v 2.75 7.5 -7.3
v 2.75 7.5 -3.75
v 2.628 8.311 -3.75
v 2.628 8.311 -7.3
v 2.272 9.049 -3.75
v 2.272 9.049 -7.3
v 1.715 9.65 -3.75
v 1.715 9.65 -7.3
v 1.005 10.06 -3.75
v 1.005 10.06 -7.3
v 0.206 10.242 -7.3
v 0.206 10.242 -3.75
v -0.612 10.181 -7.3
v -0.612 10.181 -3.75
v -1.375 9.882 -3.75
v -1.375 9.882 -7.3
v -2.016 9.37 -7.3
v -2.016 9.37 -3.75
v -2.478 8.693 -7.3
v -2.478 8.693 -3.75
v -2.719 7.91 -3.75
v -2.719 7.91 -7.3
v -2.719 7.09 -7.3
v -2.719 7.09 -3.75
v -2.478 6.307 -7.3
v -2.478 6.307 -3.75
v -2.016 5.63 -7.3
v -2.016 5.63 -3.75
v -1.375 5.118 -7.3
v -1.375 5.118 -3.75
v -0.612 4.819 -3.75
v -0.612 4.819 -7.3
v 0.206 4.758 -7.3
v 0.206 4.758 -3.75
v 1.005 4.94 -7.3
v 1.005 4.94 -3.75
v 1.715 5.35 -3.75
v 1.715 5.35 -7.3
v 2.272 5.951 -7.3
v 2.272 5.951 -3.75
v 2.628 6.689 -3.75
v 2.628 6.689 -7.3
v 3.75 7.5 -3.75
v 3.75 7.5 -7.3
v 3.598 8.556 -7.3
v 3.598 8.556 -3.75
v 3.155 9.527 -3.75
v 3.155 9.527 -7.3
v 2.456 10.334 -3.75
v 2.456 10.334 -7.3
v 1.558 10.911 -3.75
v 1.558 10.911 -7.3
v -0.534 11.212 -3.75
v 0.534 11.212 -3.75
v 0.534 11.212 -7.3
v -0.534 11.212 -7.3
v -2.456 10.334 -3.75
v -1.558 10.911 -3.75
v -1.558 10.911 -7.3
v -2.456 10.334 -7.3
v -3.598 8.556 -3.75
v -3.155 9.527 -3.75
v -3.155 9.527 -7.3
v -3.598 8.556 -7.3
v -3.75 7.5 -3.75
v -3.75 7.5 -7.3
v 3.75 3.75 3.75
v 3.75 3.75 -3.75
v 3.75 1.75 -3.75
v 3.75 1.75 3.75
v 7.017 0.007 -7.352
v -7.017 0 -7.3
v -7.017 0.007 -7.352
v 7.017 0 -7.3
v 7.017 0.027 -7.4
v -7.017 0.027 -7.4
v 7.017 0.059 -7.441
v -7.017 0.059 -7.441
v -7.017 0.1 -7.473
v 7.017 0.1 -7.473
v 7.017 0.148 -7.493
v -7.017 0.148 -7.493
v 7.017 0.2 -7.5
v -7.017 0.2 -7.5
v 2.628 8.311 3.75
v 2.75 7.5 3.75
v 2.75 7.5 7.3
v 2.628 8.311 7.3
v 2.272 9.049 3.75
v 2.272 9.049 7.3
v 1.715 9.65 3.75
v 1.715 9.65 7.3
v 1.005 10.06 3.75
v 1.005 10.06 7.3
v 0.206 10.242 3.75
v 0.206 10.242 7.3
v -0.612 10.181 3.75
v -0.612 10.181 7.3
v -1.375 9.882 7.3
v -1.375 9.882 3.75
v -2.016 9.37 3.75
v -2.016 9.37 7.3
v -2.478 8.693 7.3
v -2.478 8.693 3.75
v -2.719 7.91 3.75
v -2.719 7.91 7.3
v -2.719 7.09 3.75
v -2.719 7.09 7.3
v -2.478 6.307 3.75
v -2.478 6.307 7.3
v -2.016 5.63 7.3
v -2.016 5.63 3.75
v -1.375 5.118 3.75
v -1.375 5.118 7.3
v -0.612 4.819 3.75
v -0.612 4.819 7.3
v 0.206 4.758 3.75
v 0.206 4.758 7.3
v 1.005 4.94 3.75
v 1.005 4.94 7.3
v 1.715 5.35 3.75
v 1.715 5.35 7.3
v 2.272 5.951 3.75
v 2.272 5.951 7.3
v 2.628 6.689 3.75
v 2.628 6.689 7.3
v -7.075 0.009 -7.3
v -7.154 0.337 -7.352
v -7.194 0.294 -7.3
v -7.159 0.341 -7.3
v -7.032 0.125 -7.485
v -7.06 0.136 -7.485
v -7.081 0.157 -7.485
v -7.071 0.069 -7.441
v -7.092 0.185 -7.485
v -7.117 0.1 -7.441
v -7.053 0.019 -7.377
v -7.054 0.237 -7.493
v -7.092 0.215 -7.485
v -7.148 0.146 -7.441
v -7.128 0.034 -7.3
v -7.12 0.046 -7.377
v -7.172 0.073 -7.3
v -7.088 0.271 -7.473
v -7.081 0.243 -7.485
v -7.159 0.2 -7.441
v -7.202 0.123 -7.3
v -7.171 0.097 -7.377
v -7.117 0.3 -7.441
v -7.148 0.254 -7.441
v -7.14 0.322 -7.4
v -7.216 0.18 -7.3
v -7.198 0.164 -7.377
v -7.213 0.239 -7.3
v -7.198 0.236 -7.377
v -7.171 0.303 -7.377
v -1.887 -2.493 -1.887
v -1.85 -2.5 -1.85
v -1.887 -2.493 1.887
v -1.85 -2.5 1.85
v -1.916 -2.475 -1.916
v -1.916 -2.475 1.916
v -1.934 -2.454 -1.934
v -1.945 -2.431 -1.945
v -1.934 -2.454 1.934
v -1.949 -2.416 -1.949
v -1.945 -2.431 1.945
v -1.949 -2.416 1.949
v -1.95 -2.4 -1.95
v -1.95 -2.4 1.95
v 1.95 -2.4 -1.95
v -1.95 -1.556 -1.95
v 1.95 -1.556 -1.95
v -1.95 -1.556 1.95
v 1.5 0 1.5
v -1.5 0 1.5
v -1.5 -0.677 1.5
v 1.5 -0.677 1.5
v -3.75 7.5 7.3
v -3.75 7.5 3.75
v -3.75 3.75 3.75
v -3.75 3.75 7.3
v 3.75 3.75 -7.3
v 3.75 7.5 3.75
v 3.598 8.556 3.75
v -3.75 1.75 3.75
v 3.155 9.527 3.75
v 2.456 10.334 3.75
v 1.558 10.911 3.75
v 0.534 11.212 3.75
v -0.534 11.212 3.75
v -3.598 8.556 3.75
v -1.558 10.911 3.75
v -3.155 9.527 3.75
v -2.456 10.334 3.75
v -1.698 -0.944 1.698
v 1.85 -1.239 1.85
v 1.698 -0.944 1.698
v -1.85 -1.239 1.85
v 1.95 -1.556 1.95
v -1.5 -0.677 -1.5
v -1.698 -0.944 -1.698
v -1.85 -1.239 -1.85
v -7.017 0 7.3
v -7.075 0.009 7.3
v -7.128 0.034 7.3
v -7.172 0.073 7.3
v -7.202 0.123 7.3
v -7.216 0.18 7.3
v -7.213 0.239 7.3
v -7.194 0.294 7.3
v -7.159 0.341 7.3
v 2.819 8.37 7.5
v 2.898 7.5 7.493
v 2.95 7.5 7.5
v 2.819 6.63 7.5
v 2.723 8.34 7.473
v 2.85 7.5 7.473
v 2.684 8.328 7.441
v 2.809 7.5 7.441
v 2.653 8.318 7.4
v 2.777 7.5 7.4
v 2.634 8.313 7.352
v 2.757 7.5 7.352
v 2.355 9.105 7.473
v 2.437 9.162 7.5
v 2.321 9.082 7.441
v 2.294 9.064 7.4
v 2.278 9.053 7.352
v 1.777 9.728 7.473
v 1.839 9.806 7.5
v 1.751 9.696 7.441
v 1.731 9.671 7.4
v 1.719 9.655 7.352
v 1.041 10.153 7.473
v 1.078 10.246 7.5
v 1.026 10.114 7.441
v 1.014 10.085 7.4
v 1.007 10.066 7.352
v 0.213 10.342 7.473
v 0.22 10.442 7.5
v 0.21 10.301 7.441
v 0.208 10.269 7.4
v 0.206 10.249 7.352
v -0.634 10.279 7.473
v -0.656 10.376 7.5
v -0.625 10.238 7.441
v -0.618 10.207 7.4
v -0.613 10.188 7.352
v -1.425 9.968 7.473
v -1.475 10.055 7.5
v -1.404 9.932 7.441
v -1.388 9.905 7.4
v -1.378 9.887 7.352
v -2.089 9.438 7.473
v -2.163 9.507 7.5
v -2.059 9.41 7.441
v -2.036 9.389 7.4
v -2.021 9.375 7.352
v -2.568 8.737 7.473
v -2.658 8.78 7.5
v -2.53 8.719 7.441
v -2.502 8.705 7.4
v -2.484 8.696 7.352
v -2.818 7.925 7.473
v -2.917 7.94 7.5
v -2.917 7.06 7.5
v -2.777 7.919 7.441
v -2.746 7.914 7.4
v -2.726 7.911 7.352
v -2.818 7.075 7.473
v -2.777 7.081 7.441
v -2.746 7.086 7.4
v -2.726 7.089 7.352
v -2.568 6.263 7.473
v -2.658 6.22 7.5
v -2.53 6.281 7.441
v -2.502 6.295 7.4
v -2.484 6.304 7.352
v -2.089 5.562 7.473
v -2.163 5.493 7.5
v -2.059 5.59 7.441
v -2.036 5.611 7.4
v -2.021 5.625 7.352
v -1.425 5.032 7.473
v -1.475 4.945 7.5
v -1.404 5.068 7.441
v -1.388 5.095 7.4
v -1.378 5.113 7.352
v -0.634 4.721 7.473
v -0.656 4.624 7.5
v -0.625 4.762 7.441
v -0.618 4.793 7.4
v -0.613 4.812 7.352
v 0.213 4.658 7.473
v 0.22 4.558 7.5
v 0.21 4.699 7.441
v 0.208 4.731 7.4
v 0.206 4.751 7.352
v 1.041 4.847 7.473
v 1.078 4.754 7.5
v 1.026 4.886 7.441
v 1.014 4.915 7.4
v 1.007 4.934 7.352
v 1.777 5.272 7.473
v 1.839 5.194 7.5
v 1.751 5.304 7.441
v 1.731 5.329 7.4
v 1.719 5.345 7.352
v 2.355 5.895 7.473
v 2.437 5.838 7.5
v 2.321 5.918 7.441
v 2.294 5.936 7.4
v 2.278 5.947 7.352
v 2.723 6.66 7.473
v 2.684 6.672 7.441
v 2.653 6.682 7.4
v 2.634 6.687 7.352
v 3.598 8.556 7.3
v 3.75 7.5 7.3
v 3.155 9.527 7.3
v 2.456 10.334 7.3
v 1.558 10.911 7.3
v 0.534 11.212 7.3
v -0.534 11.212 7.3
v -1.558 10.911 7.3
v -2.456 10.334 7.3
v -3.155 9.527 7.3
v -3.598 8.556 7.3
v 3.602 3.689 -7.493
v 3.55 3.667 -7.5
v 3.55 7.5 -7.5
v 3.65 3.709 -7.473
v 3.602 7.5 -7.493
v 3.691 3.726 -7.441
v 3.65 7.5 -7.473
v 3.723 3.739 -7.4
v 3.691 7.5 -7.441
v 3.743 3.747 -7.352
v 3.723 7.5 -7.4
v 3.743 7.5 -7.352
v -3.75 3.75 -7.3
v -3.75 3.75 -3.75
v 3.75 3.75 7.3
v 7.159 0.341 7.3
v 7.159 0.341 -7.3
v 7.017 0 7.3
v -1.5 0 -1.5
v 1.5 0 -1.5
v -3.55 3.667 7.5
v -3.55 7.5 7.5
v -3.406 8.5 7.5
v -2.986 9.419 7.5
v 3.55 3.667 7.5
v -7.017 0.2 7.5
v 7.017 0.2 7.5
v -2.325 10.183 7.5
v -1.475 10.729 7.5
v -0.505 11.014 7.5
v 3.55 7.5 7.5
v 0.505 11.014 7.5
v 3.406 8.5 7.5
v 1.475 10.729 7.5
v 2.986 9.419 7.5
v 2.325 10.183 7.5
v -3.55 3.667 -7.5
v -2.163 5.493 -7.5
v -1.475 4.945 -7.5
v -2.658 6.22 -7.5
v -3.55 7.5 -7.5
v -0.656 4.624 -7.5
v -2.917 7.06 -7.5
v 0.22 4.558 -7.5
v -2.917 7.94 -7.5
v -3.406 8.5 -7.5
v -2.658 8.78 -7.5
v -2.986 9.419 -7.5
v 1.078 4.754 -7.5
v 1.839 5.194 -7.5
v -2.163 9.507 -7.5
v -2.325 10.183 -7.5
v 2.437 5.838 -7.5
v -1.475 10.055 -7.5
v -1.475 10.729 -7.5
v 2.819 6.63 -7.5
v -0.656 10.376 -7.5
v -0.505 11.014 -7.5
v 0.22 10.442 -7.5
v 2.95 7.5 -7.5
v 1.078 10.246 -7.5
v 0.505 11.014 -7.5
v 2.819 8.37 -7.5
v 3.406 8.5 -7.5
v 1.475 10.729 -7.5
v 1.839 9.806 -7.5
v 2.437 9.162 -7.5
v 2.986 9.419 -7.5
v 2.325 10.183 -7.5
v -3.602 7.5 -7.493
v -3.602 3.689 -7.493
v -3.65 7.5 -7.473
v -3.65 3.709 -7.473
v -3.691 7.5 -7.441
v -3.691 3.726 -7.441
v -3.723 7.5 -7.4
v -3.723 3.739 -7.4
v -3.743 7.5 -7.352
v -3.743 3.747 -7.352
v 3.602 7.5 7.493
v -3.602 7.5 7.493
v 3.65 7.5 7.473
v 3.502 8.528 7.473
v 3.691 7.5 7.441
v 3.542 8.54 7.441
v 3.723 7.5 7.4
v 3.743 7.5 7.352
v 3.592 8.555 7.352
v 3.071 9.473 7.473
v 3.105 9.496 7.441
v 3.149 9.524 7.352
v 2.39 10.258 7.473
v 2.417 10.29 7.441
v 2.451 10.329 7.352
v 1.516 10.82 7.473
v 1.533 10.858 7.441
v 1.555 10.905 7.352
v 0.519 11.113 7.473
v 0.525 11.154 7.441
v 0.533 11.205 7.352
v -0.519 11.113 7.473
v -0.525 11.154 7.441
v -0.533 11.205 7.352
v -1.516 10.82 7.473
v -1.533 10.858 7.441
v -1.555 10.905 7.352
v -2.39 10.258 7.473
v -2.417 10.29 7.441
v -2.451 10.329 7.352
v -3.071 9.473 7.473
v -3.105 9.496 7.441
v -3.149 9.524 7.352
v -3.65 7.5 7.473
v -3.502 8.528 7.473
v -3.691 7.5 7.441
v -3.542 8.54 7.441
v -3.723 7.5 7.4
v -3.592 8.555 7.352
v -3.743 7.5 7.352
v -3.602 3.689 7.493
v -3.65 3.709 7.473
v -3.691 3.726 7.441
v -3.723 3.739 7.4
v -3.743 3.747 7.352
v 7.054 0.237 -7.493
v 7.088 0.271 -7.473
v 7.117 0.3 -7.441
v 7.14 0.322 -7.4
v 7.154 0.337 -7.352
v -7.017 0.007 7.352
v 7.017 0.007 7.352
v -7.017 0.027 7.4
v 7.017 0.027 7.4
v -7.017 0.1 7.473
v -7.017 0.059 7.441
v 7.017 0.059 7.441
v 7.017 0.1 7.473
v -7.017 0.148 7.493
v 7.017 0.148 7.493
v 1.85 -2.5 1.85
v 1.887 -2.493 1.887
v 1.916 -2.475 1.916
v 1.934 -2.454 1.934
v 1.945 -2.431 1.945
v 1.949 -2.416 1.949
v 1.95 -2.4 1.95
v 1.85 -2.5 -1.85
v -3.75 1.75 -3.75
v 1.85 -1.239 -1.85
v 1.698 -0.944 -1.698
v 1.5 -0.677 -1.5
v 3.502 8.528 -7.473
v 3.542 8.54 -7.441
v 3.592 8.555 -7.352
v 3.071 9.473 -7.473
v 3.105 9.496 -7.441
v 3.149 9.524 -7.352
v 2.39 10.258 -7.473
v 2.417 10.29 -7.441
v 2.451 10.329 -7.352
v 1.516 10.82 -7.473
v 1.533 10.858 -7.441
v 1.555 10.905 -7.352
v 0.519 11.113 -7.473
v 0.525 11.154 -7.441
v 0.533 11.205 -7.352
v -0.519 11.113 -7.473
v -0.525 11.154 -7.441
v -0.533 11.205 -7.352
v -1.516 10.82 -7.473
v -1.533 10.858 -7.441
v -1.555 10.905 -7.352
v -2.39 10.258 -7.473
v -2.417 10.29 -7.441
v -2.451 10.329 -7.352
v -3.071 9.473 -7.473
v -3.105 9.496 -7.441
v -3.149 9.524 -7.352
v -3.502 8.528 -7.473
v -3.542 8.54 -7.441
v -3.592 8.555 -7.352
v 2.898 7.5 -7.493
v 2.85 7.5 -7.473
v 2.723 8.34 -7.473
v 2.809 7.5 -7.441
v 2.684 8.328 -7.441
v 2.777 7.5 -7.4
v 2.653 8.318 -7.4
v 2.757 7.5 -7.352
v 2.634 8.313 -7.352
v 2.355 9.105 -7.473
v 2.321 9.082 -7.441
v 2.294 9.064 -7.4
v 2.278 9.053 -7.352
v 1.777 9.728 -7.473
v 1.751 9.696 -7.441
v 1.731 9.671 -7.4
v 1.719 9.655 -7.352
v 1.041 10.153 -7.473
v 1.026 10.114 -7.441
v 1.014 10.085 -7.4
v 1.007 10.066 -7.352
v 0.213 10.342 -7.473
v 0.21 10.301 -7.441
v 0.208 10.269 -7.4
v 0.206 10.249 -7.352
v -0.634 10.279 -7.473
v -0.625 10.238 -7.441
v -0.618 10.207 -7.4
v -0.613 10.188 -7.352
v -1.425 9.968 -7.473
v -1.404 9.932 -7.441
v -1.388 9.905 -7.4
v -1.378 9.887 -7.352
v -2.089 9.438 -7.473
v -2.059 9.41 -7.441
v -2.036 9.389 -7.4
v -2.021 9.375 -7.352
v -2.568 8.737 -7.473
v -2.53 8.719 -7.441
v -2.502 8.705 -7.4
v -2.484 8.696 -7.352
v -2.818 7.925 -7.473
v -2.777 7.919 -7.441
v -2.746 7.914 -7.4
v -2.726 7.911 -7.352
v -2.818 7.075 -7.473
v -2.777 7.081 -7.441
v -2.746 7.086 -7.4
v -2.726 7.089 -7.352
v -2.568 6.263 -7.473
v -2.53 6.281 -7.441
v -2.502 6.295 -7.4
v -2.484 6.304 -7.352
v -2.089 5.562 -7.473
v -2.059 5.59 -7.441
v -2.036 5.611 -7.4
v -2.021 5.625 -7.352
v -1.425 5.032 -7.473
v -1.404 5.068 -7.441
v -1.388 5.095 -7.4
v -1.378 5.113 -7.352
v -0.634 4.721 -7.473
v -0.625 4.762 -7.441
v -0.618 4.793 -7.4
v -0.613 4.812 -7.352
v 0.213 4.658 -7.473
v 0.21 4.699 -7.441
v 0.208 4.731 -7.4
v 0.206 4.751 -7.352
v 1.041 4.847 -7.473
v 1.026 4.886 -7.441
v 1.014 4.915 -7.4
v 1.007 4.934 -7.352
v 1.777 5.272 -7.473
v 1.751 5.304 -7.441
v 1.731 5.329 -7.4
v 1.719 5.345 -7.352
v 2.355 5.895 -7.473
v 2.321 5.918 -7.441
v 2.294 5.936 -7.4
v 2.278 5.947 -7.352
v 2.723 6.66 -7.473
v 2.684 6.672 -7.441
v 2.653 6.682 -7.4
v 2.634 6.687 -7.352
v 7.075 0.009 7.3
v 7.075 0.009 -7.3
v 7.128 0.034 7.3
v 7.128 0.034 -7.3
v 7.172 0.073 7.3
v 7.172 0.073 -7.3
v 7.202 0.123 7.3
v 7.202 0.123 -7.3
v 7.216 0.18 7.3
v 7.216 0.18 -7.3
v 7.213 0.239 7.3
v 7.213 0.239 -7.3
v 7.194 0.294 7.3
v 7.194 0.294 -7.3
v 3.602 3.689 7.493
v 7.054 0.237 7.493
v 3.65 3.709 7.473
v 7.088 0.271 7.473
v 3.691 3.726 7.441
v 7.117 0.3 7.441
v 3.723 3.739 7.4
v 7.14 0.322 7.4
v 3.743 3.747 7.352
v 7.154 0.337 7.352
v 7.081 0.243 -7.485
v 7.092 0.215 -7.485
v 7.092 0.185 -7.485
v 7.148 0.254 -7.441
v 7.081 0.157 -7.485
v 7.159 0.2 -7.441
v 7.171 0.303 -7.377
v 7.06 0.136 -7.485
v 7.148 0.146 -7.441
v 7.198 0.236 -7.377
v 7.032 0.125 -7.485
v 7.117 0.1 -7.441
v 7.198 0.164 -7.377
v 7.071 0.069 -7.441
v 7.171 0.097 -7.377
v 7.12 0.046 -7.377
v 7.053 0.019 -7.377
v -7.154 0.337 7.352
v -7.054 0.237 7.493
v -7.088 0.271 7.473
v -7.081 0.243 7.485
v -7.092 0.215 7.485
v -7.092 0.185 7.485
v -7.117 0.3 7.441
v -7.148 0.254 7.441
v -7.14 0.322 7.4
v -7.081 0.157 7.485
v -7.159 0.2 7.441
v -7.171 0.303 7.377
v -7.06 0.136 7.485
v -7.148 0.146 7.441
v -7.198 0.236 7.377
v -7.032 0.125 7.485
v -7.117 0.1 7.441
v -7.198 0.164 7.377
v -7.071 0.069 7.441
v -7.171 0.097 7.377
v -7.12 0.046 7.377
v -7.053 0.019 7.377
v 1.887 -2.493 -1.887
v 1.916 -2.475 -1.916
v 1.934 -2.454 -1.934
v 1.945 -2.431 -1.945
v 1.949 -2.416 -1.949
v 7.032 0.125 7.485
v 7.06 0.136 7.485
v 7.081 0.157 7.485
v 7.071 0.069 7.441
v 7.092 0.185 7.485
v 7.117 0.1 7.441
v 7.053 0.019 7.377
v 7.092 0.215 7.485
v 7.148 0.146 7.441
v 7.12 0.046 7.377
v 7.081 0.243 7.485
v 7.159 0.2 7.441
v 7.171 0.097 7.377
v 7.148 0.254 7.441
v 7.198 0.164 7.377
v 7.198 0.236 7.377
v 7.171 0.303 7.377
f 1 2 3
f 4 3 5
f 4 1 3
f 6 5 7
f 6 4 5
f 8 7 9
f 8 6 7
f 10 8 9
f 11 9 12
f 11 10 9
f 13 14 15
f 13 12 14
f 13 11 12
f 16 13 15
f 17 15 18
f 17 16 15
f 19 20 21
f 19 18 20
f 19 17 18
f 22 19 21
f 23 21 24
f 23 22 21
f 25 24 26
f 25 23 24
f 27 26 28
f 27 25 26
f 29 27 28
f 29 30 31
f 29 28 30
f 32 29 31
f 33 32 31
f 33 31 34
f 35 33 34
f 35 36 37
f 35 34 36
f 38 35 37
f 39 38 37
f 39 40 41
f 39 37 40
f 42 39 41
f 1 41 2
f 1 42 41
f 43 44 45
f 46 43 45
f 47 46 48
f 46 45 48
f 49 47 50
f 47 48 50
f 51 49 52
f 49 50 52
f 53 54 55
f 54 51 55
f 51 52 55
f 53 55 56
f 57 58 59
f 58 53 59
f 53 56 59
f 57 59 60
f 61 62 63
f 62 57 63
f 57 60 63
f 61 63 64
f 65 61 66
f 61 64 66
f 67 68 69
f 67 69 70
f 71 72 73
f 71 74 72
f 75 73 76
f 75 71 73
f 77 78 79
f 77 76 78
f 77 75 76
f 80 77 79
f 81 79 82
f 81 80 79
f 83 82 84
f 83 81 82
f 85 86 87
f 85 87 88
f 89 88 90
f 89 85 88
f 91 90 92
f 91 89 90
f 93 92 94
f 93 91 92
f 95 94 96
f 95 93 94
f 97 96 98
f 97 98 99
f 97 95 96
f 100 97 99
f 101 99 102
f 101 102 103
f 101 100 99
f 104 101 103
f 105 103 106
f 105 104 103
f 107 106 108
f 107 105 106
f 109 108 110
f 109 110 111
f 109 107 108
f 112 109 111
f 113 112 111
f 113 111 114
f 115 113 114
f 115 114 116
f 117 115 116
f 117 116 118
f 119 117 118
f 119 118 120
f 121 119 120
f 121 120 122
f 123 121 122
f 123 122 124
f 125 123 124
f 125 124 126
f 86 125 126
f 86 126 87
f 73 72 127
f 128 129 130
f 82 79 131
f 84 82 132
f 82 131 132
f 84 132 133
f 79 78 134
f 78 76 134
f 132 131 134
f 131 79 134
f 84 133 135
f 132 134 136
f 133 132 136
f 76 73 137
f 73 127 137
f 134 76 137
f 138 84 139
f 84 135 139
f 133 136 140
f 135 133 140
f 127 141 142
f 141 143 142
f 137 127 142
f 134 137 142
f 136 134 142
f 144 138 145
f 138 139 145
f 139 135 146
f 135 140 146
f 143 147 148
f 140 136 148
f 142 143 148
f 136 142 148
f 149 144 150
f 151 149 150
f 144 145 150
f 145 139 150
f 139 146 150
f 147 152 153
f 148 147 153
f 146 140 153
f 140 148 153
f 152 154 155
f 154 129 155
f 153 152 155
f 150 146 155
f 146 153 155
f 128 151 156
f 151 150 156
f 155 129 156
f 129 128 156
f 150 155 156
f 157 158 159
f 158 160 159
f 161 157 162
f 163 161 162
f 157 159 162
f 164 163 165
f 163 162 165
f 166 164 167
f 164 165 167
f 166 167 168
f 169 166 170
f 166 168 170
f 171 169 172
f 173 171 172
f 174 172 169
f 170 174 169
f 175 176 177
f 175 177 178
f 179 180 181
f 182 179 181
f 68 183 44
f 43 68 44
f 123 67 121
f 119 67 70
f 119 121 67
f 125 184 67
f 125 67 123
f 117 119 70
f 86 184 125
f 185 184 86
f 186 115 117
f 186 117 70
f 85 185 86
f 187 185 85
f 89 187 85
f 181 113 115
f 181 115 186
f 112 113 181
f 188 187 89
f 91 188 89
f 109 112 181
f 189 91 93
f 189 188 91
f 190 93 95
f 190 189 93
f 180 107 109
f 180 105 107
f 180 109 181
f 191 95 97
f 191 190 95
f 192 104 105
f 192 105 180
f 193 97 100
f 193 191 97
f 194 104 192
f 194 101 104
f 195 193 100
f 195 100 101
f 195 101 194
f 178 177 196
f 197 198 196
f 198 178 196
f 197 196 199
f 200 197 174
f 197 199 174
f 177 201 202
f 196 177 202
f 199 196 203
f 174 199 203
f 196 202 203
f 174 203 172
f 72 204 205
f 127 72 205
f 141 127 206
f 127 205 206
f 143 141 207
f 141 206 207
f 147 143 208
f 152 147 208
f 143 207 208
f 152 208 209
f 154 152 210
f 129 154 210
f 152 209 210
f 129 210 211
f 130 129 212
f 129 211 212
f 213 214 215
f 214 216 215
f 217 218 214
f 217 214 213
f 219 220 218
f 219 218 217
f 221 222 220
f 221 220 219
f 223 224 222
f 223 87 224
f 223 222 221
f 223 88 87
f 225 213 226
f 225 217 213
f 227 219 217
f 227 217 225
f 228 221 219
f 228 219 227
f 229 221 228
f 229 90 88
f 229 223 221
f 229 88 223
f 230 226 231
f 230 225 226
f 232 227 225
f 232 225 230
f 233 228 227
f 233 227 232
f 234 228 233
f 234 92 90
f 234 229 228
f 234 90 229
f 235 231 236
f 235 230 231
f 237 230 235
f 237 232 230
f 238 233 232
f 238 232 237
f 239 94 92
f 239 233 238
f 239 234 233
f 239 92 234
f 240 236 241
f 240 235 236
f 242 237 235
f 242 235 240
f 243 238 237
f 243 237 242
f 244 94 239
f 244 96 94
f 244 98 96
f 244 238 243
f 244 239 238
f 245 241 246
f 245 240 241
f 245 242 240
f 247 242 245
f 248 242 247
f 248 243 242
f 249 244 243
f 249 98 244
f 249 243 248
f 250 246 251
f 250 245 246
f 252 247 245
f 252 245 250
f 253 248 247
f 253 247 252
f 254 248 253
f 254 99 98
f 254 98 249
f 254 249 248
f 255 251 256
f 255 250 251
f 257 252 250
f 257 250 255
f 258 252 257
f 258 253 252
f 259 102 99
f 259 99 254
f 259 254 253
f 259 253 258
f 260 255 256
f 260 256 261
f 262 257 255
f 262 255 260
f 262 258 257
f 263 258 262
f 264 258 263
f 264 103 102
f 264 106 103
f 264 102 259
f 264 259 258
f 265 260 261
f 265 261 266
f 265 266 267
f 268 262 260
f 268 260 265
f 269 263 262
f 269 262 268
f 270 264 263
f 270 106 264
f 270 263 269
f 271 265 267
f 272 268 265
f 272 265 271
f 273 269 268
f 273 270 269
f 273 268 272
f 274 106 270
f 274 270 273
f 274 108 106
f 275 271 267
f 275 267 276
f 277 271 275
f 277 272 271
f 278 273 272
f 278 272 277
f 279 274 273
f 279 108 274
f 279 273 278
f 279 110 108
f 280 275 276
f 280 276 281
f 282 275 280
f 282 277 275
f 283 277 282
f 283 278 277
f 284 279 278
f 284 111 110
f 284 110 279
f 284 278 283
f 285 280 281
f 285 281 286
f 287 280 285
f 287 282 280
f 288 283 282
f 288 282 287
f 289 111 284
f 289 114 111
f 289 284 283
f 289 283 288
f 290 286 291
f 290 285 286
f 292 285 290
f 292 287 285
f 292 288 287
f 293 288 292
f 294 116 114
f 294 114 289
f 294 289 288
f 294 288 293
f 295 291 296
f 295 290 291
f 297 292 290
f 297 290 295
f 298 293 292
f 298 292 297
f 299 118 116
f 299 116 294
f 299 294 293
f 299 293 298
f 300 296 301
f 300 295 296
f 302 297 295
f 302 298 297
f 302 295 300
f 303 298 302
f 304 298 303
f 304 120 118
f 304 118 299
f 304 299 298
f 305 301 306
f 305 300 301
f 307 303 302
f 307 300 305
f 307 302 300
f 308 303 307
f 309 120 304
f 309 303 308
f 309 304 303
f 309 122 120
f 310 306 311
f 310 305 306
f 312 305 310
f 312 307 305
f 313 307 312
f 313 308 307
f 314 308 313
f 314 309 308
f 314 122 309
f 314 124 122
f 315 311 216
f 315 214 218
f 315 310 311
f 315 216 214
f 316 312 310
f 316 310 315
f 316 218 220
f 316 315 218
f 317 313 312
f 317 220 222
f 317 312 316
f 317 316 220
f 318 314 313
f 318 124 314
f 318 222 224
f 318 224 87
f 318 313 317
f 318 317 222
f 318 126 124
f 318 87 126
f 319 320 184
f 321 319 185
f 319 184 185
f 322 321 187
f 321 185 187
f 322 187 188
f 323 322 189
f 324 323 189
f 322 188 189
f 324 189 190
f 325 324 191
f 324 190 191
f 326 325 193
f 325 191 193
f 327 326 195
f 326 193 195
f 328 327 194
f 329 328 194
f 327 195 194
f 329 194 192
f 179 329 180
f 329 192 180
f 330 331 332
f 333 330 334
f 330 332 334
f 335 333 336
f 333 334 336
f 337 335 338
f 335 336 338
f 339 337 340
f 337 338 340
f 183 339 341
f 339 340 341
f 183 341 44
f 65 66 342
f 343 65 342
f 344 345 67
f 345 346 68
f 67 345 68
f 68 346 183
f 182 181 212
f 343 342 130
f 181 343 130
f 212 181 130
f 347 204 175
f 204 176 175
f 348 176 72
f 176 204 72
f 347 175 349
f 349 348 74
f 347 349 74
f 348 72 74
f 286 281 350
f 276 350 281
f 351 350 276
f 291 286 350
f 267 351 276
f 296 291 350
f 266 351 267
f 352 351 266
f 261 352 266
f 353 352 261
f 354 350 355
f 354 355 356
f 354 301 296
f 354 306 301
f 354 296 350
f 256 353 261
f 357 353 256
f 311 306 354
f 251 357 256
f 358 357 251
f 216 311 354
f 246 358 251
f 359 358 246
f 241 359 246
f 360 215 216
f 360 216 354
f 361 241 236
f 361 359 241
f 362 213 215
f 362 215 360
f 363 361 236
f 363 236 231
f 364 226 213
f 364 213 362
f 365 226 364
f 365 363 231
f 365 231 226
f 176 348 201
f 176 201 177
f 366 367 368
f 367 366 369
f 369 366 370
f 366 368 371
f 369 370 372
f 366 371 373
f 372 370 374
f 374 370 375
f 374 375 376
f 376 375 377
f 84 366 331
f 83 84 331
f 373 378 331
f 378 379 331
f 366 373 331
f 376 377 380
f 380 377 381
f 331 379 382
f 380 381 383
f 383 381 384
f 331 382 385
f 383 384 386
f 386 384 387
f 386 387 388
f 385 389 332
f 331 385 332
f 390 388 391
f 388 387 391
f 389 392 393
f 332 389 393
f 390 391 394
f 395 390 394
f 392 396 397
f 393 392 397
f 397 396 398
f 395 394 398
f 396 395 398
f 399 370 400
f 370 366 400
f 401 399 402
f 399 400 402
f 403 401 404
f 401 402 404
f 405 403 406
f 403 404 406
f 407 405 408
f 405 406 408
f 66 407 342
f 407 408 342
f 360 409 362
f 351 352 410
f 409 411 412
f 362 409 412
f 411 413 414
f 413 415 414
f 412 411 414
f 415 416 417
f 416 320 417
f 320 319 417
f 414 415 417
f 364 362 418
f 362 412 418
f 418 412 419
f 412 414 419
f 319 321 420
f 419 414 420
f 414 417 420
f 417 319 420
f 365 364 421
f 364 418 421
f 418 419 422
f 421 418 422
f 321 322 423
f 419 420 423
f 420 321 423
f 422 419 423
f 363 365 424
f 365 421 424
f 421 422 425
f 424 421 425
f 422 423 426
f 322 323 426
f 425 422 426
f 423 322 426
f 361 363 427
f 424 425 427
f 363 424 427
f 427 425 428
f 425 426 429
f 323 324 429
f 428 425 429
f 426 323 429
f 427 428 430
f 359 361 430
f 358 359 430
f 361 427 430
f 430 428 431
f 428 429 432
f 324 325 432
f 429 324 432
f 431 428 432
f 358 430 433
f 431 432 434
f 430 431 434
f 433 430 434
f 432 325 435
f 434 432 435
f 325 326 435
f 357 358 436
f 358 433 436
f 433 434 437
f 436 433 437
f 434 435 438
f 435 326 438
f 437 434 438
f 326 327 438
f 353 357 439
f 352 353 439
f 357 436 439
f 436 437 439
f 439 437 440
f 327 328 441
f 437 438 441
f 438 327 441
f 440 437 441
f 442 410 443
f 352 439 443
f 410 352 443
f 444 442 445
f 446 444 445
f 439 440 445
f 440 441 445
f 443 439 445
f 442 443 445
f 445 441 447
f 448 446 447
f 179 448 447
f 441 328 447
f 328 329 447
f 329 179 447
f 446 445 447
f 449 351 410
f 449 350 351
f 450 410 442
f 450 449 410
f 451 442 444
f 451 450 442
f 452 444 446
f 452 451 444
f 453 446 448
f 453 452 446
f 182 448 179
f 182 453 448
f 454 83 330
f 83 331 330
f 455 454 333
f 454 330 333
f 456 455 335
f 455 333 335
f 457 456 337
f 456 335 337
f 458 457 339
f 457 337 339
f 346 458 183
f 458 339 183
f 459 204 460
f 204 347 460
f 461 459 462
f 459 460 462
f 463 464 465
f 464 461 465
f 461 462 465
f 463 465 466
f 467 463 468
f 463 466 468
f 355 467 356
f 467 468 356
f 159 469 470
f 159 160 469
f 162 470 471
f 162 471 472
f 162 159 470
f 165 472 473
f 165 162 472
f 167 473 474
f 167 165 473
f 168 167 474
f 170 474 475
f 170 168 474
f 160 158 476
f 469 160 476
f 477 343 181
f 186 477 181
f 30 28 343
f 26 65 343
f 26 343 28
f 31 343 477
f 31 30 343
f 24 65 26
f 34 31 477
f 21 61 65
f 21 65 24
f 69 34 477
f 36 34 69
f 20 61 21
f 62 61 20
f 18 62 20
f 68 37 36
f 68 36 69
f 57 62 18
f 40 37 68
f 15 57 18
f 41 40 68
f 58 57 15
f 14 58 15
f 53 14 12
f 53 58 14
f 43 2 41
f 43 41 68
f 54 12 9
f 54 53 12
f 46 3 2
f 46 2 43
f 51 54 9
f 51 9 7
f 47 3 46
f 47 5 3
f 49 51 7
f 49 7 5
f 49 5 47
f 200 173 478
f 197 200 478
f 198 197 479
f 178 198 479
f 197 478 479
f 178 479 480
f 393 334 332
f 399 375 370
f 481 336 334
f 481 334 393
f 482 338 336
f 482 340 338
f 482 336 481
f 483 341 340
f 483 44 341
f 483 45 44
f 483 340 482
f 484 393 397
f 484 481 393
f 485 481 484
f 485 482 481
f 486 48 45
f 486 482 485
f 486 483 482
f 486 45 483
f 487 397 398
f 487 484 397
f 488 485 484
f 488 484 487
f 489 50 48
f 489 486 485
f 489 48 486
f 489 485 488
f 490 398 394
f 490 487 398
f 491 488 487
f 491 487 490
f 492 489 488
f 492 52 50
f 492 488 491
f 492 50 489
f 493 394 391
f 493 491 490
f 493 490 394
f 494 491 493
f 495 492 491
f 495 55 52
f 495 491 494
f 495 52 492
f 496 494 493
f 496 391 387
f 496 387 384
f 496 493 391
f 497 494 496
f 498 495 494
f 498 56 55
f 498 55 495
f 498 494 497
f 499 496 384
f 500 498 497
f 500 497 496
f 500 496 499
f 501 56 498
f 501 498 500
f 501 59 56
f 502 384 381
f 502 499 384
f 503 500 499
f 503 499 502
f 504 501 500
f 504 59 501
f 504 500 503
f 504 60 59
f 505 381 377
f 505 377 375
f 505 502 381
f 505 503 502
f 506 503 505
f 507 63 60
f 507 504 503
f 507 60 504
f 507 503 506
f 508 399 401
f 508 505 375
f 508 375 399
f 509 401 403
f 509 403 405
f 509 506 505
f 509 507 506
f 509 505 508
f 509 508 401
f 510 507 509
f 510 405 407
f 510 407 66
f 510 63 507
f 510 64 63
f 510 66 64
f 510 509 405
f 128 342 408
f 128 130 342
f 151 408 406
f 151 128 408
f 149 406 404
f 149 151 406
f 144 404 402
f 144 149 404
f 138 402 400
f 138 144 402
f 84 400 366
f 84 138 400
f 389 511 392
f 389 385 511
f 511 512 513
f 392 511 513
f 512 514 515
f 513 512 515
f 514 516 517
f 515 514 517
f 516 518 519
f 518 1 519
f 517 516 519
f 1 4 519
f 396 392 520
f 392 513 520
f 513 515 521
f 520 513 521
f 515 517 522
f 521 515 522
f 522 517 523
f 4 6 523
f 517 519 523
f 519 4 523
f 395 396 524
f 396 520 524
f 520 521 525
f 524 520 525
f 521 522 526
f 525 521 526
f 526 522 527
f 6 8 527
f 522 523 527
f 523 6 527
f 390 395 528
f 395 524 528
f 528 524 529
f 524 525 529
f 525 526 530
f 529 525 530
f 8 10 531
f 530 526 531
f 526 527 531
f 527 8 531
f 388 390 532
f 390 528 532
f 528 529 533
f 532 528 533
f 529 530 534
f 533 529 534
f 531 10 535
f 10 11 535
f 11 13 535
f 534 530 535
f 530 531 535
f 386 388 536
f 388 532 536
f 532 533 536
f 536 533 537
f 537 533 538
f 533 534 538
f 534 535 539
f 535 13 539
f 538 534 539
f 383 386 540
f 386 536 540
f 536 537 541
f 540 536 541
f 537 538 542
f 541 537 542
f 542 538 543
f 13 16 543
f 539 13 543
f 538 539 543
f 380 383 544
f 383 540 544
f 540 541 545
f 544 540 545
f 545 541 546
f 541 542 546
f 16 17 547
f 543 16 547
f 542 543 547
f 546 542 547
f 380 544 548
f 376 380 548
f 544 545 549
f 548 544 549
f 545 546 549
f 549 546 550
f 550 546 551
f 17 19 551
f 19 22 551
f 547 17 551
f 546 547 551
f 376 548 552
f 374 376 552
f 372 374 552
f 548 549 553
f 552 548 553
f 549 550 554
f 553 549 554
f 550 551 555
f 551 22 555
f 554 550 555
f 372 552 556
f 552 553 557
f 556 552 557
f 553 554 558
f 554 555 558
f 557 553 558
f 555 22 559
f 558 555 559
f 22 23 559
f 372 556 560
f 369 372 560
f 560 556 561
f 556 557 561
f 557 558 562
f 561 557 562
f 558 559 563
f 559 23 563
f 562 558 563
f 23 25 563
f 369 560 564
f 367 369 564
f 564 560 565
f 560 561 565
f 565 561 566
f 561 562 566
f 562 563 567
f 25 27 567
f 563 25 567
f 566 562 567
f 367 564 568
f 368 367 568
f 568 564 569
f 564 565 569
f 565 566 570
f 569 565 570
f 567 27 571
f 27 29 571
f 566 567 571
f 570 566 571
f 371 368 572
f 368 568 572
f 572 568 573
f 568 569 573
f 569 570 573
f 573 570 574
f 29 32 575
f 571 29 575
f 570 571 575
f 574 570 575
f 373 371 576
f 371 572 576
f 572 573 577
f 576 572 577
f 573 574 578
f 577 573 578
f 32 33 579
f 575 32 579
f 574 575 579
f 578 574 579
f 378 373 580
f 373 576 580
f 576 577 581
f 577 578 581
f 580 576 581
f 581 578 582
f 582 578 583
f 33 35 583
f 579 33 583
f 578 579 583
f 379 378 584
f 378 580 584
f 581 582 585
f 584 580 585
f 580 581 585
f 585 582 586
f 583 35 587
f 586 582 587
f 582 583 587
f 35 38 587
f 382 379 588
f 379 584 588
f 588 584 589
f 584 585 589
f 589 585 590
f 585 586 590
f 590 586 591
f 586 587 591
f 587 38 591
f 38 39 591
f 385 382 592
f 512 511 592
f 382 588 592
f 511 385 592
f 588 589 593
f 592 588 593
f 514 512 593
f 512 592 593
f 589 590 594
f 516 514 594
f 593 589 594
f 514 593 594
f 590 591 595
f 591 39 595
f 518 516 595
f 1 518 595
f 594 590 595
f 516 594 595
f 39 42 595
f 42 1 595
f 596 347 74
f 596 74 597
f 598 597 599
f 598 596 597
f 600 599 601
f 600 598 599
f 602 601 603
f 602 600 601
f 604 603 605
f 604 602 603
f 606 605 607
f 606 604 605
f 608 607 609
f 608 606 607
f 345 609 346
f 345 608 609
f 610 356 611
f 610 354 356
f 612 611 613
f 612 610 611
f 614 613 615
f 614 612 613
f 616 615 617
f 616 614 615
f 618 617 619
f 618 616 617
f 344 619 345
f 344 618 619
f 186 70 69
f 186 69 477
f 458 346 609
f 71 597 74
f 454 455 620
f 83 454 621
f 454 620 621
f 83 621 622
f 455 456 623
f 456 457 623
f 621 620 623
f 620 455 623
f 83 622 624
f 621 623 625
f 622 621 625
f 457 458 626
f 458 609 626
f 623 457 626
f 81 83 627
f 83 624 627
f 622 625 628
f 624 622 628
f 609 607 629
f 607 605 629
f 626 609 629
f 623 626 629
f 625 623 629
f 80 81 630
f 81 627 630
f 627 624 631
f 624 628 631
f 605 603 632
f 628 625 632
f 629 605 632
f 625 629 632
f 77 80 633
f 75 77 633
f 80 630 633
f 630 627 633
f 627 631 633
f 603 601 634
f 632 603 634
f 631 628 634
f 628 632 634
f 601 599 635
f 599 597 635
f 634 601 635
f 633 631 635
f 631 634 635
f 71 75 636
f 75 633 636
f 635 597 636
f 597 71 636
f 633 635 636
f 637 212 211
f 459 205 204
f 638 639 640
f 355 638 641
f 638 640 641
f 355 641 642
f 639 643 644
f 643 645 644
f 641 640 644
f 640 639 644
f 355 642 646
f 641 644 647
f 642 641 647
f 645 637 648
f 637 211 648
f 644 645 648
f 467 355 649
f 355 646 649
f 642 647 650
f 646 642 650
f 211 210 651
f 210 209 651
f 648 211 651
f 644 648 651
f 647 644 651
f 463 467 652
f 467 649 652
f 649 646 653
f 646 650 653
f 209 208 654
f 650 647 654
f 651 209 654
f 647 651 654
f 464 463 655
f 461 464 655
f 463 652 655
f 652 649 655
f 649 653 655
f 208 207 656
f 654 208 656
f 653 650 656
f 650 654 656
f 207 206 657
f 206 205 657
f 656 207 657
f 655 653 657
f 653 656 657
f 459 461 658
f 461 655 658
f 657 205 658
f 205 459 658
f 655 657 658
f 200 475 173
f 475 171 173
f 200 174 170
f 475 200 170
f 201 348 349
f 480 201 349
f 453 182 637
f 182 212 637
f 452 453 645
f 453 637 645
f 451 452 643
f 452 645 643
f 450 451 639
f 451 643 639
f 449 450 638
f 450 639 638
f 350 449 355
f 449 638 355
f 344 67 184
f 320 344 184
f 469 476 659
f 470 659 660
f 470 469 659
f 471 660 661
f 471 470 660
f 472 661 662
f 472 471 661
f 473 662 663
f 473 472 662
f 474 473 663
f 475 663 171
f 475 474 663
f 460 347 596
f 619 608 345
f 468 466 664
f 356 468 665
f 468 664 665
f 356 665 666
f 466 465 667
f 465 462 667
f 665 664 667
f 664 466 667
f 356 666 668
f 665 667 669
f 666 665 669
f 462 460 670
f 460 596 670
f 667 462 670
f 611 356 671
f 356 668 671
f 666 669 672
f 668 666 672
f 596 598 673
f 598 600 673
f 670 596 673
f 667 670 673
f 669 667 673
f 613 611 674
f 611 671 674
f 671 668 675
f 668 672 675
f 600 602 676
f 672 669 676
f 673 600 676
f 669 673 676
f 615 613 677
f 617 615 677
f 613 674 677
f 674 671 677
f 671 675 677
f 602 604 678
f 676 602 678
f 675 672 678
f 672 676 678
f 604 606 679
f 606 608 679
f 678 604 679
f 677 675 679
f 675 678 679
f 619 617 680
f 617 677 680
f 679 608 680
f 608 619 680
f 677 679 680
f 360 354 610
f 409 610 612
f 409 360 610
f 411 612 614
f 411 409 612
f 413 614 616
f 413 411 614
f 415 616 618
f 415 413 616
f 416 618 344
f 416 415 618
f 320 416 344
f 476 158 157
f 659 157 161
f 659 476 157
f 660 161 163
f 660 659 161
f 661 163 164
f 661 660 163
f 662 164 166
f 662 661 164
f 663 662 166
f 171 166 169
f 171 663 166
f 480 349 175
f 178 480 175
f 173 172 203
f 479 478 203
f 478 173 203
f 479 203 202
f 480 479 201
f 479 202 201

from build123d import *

# Parameters (mm, degrees)
EXTRUDE_1_DEPTH                 = 7.5
EXTRUDE_1_DEPTH_BACK            = 7.5
SKETCH_1_R                      = 2.75
CUT_EXTRUDE_1_DEPTH             = 3.75
CUT_EXTRUDE_1_DEPTH_BACK        = 3.75
SKETCH_2_W                      = 7.5
SKETCH_2_H                      = 8.25
SKETCH_3_W                      = 7.5
SKETCH_3_H                      = 7.5
CUT_EXTRUDE_2_DEPTH             = 2
SKETCH_4_W                      = 3
SKETCH_4_H                      = 3
EXTRUDE_2_DEPTH                 = 1
EXTRUDE_3_DEPTH                 = 2
EXTRUDE_3_DEPTH_BACK            = 2
CUT_EXTRUDE_3_REACH             = 17.462
CUT_EXTRUDE_3_DIRECTION_2_REACH = 17.462
FILLET_1_R                      = 0.1
FILLET_2_R                      = 0.2


with BuildPart() as part:
    # 草图1 → 凸台-拉伸1 (new, two sides: drawn at the far end of the back side and taken through both)
    with BuildSketch(Plane.XY.offset(-EXTRUDE_1_DEPTH_BACK)):
        with BuildLine():
            Line((-7.5, 0), (7.5, 0))
            Line((7.5, 0), (3.75, 3.75))
            Line((3.75, 3.75), (3.75, 7.5))
            ThreePointArc((3.75, 7.5), (0, 11.25), (-3.75, 7.5))
            Line((-3.75, 7.5), (-3.75, 3.75))
            Line((-3.75, 3.75), (-7.5, 0))
        make_face()
        with Locations((0, 7.5)):
            Circle(SKETCH_1_R, mode=Mode.SUBTRACT)
    extrude(amount=EXTRUDE_1_DEPTH + EXTRUDE_1_DEPTH_BACK)

    # 草图2 → 切除-拉伸1 (cut, two sides: drawn at the far end of the back side and taken through both)
    with BuildSketch(Plane.XY.offset(-CUT_EXTRUDE_1_DEPTH_BACK)):
        with Locations((0, 7.875)):
            Rectangle(SKETCH_2_W, SKETCH_2_H)
    extrude(amount=CUT_EXTRUDE_1_DEPTH + CUT_EXTRUDE_1_DEPTH_BACK, mode=Mode.SUBTRACT)

    # 草图3 → 切除-拉伸2 (cut)
    with BuildSketch(Plane(origin=(0, 3.75, 0), x_dir=(-1, 0, 0), z_dir=(0, 1, 0))):
        Rectangle(SKETCH_3_W, SKETCH_3_H)
    extrude(amount=-CUT_EXTRUDE_2_DEPTH, mode=Mode.SUBTRACT)

    # 草图4 → 凸台-拉伸2 (add)
    with BuildSketch(Plane.XZ):
        Rectangle(SKETCH_4_W, SKETCH_4_H)
    extrude(amount=EXTRUDE_2_DEPTH)

    # 草图5 → 凸台-拉伸3 (add, two sides: drawn at the far end of the back side and taken through both)
    with BuildSketch(Plane.XY.offset(-EXTRUDE_3_DEPTH_BACK)):
        with BuildLine():
            Line((-1.95, -2.5), (1.95, -2.5))
            Line((1.95, -2.5), (1.95, -1.555590279))
            ThreePointArc((1.95, -1.555590279), (1.780042303, -1.088161527), (1.5, -0.677124344))
            Line((1.5, -0.677124344), (-1.5, -0.677124344))
            ThreePointArc((-1.5, -0.677124344), (-1.780042303, -1.088161527), (-1.95, -1.555590279))
            Line((-1.95, -1.555590279), (-1.95, -2.5))
        make_face()
    extrude(amount=EXTRUDE_3_DEPTH + EXTRUDE_3_DEPTH_BACK)

    # 草图6 → 切除-拉伸3 (cut, up to next)
    with BuildSketch(Plane(origin=(0, 0, 0), x_dir=(0, 0, -1), z_dir=(1, 0, 0)), mode=Mode.PRIVATE) as cut_extrude_3_sk1:
        with BuildLine():
            Line((1.95, -2.5), (1.95, -1.555590279))
            ThreePointArc((1.95, -1.555590279), (1.780042303, -1.088161527), (1.5, -0.677124344))
            Line((1.5, -0.677124344), (2, -0.677124344))
            Line((2, -0.677124344), (2, -2.5))
            Line((2, -2.5), (1.95, -2.5))
        make_face()
    cut_extrude_3_tool1 = extrude(cut_extrude_3_sk1.sketch, amount=-CUT_EXTRUDE_3_REACH, mode=Mode.PRIVATE) & part.part
    # 草图6 → 切除-拉伸3 (cut, up to next)
    with BuildSketch(Plane(origin=(0, 0, 0), x_dir=(0, 0, -1), z_dir=(1, 0, 0)), mode=Mode.PRIVATE) as cut_extrude_3_sk2:
        with BuildLine():
            Line((-2, -2.5), (-2, -0.677124344))
            Line((-2, -0.677124344), (-1.5, -0.677124344))
            ThreePointArc((-1.5, -0.677124344), (-1.780042303, -1.088161527), (-1.95, -1.555590279))
            Line((-1.95, -1.555590279), (-1.95, -2.5))
            Line((-1.95, -2.5), (-2, -2.5))
        make_face()
    cut_extrude_3_tool2 = extrude(cut_extrude_3_sk2.sketch, amount=-CUT_EXTRUDE_3_REACH, mode=Mode.PRIVATE) & part.part
    add(cut_extrude_3_tool1.solids().sort_by_distance((0, -1.175075, -1.873038))[0], mode=Mode.SUBTRACT)
    add(cut_extrude_3_tool2.solids().sort_by_distance((0, -1.175075, 1.873038))[0], mode=Mode.SUBTRACT)

    # 草图6 → 切除-拉伸3 direction 2 (cut, up to next)
    with BuildSketch(Plane(origin=(0, 0, 0), x_dir=(0, 0, -1), z_dir=(1, 0, 0)), mode=Mode.PRIVATE) as cut_extrude_3_direction_2_sk1:
        with BuildLine():
            Line((1.95, -2.5), (1.95, -1.555590279))
            ThreePointArc((1.95, -1.555590279), (1.780042303, -1.088161527), (1.5, -0.677124344))
            Line((1.5, -0.677124344), (2, -0.677124344))
            Line((2, -0.677124344), (2, -2.5))
            Line((2, -2.5), (1.95, -2.5))
        make_face()
    cut_extrude_3_direction_2_tool1 = extrude(cut_extrude_3_direction_2_sk1.sketch, amount=CUT_EXTRUDE_3_DIRECTION_2_REACH, mode=Mode.PRIVATE) & part.part
    # 草图6 → 切除-拉伸3 direction 2 (cut, up to next)
    with BuildSketch(Plane(origin=(0, 0, 0), x_dir=(0, 0, -1), z_dir=(1, 0, 0)), mode=Mode.PRIVATE) as cut_extrude_3_direction_2_sk2:
        with BuildLine():
            Line((-2, -2.5), (-2, -0.677124344))
            Line((-2, -0.677124344), (-1.5, -0.677124344))
            ThreePointArc((-1.5, -0.677124344), (-1.780042303, -1.088161527), (-1.95, -1.555590279))
            Line((-1.95, -1.555590279), (-1.95, -2.5))
            Line((-1.95, -2.5), (-2, -2.5))
        make_face()
    cut_extrude_3_direction_2_tool2 = extrude(cut_extrude_3_direction_2_sk2.sketch, amount=CUT_EXTRUDE_3_DIRECTION_2_REACH, mode=Mode.PRIVATE) & part.part
    add(cut_extrude_3_direction_2_tool1.solids().sort_by_distance((0, -1.175075, -1.873038))[0], mode=Mode.SUBTRACT)
    add(cut_extrude_3_direction_2_tool2.solids().sort_by_distance((0, -1.175075, 1.873038))[0], mode=Mode.SUBTRACT)

    # 圆角1
    fillet_1_edges = [part.edges().sort_by_distance(p)[0] for p in [
        (-1.95, -2.5, 0),
        (1.95, -2.5, 0),
        (0, -2.5, -1.95),
        (0, -2.5, 1.95),
    ]]
    fillet(fillet_1_edges, radius=FILLET_1_R)

    # 圆角2
    fillet_2_edges = [part.edges().sort_by_distance(p)[0] for p in [
        (0, 11.25, 7.5),
        (7.5, 0, 0),
        (-7.5, 0, 0),
        (-3.75, 5.625, 7.5),
        (-5.625, 1.875, 7.5),
        (-2.75, 7.5, 7.5),
        (0, 0, 7.5),
        (5.625, 1.875, -7.5),
        (0, 0, -7.5),
        (-5.625, 1.875, -7.5),
        (-3.75, 5.625, -7.5),
        (0, 11.25, -7.5),
        (3.75, 5.625, -7.5),
        (-2.75, 7.5, -7.5),
        (5.625, 1.875, 7.5),
        (3.75, 5.625, 7.5),
    ]]
    fillet(fillet_2_edges, radius=FILLET_2_R)


solid = part.part
